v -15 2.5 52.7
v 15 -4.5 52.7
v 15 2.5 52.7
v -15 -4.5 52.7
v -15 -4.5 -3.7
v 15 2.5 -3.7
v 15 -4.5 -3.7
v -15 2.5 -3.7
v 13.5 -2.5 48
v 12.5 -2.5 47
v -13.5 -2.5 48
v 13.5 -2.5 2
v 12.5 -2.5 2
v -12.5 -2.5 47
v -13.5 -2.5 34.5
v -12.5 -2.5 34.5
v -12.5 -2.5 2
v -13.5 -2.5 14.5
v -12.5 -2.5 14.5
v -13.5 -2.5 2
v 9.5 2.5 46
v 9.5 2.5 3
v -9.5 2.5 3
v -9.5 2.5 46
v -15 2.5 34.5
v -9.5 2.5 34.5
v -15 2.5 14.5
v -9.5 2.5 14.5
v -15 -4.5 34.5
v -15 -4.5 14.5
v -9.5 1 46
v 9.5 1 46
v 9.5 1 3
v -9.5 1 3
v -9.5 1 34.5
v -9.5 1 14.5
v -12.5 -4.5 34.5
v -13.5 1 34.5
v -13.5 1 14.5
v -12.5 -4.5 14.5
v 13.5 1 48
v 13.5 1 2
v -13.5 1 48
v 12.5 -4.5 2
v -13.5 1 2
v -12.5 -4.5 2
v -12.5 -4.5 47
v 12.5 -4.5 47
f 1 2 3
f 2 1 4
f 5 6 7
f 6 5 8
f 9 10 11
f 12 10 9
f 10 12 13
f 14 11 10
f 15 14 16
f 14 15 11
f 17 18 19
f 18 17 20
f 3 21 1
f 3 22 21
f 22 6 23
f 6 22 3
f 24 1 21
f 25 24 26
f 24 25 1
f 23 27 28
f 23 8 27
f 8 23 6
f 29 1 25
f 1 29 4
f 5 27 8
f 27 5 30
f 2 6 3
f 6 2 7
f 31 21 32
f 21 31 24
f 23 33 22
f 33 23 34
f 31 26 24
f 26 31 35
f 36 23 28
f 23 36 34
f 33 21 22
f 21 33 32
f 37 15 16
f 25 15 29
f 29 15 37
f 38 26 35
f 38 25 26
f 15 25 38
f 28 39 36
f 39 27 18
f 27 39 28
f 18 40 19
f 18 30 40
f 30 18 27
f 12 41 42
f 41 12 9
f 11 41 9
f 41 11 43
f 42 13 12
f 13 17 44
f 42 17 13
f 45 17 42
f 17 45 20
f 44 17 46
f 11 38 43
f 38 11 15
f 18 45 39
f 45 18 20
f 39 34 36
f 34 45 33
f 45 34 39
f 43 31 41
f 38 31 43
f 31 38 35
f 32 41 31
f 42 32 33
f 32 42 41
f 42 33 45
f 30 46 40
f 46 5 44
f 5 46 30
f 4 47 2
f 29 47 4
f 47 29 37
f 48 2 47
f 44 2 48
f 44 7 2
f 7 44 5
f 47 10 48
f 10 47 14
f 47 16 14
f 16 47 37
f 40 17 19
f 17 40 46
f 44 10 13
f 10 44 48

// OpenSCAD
difference(){

rotate([90,90,0])
    translate([-24.5,0,0])
        scale([56.4,30,5])
            cube([1,1,1],center=true);

rotate([90,90,0])
    translate([-24.5,0,2.0])
        cube([43,19,10],center=true);
    
rotate([90,90,0])
    translate([-24.5,-15,0])
        scale([20,15,10])
            cube([1,1,1],center=true);
translate([0,-5,25])
    cube([27,12,46], center = true);
}


difference(){

rotate([90,90,0])
    translate([-24.5,0,3.50])
        scale([56.4,30,2])
            cube([1,1,1],center=true);

rotate([90,90,0])
    translate([-24.5,0,3.50])
        cube([45,25,10],center=true);
rotate([90,90,0])
    translate([-24.5,-15,3.50])
        scale([20,15,10])
            cube([1,1,1],center=true);
}



//difference(){
//    rotate([90,90,0])
//        translate([-24.5,0,5])
//            scale([56.4,30,5])
//                cube([1,1,1],center=true);
//    rotate([90,0,0])
//        translate([13.5,0,2])
//            cylinder(5,1,1);
//
//    rotate([90,0,0])
//        translate([13.5,50,2])
//            cylinder(5,1,1);
//    rotate([90,90,0])
//        translate([-10.5,-5,0])
//            scale([10,10,20])
//            cube([1,1,1],center=true);
//    rotate([90,90,0])
//        translate([-37.5,-5,0])
//            scale([10,10,20])
//                cube([1,1,1],center=true);
//
//
//
//}
